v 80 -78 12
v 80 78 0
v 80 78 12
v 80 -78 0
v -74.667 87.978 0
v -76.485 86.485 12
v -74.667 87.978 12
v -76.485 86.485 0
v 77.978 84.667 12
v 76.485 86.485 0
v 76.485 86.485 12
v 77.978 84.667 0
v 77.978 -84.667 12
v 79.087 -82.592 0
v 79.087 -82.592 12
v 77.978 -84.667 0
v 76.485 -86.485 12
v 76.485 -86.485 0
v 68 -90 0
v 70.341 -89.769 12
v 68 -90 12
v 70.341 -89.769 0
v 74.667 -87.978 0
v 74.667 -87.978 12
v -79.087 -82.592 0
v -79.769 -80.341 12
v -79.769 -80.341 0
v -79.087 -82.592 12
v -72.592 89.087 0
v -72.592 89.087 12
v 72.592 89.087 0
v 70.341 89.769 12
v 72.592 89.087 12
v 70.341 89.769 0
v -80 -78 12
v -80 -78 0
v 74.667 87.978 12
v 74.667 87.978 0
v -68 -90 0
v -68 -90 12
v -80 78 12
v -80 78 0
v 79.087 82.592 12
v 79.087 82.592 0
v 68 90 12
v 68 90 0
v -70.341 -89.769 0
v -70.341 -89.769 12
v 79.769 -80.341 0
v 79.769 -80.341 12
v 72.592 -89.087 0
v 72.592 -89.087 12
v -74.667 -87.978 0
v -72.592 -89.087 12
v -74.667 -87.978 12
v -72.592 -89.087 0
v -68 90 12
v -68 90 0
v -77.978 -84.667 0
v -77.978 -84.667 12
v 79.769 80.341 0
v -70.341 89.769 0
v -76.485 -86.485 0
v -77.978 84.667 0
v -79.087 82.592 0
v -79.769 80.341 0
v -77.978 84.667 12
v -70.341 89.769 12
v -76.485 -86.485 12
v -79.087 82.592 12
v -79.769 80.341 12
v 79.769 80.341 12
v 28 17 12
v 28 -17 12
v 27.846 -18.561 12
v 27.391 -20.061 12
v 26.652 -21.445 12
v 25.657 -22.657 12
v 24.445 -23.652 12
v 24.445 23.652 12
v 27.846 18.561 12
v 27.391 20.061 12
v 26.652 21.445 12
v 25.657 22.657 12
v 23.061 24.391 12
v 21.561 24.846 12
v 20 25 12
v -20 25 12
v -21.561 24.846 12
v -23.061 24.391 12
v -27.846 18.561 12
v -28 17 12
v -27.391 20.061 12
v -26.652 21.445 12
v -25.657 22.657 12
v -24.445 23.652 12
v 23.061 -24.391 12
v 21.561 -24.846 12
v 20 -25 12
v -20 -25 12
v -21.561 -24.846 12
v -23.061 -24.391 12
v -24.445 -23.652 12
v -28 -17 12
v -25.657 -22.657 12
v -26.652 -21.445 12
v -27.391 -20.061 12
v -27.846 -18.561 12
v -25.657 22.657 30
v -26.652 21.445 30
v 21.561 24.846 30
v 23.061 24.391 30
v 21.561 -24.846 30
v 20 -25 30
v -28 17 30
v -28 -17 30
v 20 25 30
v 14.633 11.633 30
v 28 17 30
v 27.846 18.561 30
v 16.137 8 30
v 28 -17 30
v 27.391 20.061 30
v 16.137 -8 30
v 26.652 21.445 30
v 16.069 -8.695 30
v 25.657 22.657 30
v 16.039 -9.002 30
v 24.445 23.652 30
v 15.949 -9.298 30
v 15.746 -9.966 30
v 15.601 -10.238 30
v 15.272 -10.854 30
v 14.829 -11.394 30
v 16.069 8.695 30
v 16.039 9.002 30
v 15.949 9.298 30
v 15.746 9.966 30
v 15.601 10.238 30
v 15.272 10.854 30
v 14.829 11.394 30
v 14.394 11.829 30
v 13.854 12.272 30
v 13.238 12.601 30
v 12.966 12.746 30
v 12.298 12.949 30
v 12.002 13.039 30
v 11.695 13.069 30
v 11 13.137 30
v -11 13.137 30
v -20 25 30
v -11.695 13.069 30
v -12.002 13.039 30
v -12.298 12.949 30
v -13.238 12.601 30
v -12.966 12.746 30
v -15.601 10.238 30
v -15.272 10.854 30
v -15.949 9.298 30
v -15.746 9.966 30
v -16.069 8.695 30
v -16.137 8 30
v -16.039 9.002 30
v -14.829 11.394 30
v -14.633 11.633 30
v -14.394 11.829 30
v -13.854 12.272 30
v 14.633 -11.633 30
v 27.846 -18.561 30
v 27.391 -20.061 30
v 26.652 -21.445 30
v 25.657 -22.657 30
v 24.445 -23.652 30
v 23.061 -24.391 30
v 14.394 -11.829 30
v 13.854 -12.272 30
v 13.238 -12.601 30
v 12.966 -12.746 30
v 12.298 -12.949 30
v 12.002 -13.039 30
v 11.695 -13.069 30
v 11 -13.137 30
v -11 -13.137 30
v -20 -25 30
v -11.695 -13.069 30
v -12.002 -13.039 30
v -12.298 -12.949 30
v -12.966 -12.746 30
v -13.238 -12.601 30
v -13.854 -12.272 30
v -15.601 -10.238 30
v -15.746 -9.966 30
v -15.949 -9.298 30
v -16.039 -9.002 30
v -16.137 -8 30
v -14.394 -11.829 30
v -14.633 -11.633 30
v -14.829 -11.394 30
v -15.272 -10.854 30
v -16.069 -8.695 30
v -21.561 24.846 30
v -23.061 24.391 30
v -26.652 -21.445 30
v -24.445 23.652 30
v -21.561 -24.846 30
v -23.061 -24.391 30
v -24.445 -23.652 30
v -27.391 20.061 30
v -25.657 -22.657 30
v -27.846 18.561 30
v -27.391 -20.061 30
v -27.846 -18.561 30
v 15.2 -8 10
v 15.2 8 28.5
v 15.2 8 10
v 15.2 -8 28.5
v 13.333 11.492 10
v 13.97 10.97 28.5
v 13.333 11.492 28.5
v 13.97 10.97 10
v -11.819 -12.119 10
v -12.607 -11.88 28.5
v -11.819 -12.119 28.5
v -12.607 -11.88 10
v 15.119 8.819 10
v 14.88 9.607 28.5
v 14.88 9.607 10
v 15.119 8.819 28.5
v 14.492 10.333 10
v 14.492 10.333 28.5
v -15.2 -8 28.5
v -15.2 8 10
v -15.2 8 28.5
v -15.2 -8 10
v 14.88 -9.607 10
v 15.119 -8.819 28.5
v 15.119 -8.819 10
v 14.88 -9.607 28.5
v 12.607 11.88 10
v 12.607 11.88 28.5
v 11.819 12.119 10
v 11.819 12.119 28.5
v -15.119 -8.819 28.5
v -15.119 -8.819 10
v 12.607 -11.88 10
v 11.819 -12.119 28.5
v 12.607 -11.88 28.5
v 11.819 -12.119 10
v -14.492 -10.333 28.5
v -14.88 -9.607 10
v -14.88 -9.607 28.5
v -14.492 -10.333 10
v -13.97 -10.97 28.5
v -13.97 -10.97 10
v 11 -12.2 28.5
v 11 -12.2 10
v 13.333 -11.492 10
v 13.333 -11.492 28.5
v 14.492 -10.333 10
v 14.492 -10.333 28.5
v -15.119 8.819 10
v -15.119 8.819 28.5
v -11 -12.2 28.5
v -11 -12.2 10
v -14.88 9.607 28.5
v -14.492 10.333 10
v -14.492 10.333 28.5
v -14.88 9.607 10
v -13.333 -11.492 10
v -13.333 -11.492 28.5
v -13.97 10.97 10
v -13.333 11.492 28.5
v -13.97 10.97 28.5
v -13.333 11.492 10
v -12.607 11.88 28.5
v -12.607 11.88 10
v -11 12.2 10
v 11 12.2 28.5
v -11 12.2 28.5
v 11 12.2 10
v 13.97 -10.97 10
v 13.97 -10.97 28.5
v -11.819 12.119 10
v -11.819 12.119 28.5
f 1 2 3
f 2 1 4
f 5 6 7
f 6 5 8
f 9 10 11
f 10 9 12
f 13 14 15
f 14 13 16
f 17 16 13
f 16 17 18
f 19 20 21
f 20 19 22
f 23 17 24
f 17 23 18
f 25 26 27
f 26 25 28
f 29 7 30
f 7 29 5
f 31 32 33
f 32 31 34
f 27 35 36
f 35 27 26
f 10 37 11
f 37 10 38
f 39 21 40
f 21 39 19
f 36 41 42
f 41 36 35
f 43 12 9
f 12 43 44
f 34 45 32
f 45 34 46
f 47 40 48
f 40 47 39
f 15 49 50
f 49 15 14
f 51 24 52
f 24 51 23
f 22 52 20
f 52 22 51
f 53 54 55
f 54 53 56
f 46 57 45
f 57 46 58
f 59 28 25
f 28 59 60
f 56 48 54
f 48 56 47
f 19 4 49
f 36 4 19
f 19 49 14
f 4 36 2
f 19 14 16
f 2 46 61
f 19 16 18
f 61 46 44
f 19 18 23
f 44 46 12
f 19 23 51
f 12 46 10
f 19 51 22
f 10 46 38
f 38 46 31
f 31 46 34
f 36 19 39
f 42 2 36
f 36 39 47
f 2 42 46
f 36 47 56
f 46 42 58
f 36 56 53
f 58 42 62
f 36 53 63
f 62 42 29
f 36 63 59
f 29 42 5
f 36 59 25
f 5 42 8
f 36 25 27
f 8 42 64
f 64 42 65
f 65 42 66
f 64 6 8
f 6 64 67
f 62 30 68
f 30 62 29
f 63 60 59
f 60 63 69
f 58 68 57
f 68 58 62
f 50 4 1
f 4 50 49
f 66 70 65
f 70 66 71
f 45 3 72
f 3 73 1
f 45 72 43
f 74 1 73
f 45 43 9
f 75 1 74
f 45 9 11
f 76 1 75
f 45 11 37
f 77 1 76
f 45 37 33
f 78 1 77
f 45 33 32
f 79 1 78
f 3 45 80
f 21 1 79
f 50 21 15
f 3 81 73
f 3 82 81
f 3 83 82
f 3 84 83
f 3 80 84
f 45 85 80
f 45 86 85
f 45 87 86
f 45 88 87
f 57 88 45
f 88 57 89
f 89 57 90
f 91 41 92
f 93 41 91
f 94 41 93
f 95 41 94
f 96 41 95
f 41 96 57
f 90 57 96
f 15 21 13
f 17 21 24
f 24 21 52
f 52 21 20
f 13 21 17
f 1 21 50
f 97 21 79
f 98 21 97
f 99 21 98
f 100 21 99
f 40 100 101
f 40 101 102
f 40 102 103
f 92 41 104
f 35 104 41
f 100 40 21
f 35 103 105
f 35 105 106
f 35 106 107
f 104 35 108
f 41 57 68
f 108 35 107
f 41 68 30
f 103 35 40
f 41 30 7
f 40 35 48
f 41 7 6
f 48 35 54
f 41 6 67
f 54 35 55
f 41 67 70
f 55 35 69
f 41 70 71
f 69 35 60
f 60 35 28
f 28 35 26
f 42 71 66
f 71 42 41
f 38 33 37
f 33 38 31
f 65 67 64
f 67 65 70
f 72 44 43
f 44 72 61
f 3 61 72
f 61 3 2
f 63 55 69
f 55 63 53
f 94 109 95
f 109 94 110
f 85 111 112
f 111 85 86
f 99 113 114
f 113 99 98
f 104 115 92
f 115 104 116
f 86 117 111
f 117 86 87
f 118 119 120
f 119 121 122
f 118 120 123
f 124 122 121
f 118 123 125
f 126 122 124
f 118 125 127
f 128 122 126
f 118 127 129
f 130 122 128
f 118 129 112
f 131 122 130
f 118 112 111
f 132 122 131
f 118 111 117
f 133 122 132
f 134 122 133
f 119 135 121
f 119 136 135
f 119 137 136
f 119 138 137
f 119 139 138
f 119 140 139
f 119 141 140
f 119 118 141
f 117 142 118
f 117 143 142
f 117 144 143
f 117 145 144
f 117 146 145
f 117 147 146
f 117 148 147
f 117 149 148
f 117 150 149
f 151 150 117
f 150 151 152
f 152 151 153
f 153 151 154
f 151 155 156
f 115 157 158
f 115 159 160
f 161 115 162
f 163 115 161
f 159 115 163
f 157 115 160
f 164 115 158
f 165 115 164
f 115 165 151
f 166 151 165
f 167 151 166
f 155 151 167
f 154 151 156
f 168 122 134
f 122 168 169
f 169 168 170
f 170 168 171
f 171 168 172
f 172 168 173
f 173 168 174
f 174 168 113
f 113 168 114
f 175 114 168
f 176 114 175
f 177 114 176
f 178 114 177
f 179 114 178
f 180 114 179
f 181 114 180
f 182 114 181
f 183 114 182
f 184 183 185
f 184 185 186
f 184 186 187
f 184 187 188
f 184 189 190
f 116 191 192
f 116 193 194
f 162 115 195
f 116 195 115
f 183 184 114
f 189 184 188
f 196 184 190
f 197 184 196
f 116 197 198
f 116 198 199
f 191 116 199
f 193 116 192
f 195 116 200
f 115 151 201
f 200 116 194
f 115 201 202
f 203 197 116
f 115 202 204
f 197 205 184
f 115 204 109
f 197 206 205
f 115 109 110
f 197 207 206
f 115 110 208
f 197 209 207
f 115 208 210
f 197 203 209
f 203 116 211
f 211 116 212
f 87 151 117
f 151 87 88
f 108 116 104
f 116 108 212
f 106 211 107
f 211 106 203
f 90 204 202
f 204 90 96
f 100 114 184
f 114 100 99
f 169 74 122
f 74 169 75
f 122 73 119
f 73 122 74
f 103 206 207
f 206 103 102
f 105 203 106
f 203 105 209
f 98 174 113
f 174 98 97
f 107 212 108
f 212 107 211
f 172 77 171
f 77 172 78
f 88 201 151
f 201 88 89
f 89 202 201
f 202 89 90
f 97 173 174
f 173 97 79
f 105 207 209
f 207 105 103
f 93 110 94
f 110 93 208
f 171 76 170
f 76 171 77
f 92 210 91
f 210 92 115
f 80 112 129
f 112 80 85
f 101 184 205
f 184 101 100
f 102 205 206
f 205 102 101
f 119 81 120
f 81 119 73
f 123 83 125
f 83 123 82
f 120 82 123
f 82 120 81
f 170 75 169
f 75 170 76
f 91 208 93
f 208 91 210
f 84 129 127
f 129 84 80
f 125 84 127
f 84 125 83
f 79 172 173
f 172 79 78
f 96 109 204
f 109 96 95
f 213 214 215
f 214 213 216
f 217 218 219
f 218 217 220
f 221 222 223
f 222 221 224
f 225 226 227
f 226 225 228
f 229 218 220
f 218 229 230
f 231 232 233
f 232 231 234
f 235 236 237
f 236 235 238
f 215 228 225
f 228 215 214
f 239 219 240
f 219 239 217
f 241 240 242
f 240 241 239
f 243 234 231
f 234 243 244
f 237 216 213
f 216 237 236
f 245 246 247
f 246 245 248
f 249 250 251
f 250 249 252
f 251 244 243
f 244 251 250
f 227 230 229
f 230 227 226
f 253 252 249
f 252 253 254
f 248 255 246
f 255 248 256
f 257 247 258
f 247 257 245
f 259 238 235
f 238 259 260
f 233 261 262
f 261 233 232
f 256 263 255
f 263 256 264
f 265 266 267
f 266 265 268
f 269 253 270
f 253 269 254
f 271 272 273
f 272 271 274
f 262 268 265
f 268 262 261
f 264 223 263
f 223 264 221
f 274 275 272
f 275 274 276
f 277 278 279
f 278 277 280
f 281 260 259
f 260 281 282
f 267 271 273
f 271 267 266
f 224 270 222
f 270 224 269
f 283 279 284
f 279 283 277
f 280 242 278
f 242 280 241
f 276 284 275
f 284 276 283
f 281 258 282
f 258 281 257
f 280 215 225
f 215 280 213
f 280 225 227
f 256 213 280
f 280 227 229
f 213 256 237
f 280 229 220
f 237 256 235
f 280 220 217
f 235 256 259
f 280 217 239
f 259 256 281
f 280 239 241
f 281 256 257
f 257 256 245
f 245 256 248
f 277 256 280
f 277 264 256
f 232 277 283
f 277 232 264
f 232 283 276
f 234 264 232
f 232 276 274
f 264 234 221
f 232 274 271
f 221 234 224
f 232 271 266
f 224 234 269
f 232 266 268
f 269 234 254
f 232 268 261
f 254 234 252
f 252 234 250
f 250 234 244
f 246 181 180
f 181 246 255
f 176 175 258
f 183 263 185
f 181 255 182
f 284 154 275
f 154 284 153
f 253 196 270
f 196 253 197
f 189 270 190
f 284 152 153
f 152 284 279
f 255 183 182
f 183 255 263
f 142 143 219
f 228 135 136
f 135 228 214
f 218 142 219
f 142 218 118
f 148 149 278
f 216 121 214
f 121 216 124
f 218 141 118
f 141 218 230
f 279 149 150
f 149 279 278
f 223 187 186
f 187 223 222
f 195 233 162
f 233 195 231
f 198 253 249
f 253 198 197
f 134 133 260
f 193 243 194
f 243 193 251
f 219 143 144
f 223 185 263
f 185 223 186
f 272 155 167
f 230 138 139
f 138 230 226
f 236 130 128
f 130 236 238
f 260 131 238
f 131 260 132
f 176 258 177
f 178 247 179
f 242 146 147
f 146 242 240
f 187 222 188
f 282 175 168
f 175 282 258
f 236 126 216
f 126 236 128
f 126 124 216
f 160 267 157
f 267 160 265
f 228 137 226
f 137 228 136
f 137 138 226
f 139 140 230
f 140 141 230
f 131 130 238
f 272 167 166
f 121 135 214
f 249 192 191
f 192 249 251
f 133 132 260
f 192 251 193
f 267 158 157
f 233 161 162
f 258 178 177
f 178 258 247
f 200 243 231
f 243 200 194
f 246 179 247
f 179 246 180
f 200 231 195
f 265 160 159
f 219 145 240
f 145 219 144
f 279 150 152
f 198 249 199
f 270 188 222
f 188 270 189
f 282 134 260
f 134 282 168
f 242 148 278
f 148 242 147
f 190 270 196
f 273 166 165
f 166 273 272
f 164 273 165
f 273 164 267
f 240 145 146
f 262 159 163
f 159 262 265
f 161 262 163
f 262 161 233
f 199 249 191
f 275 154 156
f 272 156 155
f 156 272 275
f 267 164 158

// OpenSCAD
// Headphone stand in three parts - PLA, no supports, 0.4mm nozzle
// Print orientations (+Z up, bottom on bed):
//   base   : flat, plate bottom on bed
//   post   : vertical, bottom on bed (250+ tall)
//   hanger : flat bottom on bed, curved top up, socket opening down (bridged)
// Assembly (desk Z=0): base 0-30, post 10-262, hanger 244-270 (top ~270)

part = "base"; // [base:Base, post:Post, hanger:Hanger, assembly:Assembly]
cadverify_only = "";
module instance(name, part, unit = 1) {
    echo(cadverify_instance = [name, part, unit]);
    if (cadverify_only == "" || cadverify_only == name) children();
}

// ---------- parameters ----------
baseW = 160; baseD = 180; baseT = 12; baseR = 12;
bossW = 56; bossD = 50; bossH = 18; bossR = 8;
bossTop = baseT + bossH; // 30
sockW = 30.4; sockD = 24.4; sockR = 4.2; // base socket (post 30x24 +0.4)
sockDepthBase = 20;
sockFloorBase = bossTop - sockDepthBase; // 10
flare = 1.5;
mouthWBase = sockW + 2*flare; mouthDBase = sockD + 2*flare; mouthRBase = sockR + flare;

postW = 30; postD = 24; postR = 4; postH = 252; postCham = 1.5;
tipW = postW - 2*postCham; tipD = postD - 2*postCham; tipR = 2.5;

hangW = 42; hangL = 120; hangZc = 26; hangZe = 14; hangFillet = 8; hangPlanR = 15;
hangSockW = 30.4; hangSockD = 24.4; hangSockR = 4.2; hangSockDepth = 18;
mouthWH = hangSockW + 2*flare; mouthDH = hangSockD + 2*flare; mouthRH = hangSockR + flare;

postZ = 10;          // post bottom in assembly
hangerZ = 244;       // hanger bottom in assembly -> top 270
// post top = postZ+postH = 262 = hangerZ+hangSockDepth (socket floor)

// ---------- helpers ----------
module rounded_box(W,D,H,R) {
    // centered in XY, bottom at Z=0
    if (R <= 0.01) {
        translate([-W/2,-D/2,0]) cube([W,D,H]);
    } else {
        hull() {
            for (sx=[-1,1], sy=[-1,1])
                translate([sx*(W/2-R), sy*(D/2-R), 0])
                    cylinder(r=R, h=H, $fn=32);
        }
    }
}
module rect_frustum(W1,D1,R1, W2,D2,R2, H) {
    // bottom size 1 at Z=0, top size 2 at Z=H
    hull() {
        translate([0,0,0]) rounded_box(W1,D1,0.1,R1);
        translate([0,0,H-0.1]) rounded_box(W2,D2,0.1,R2);
    }
}

// ---------- parts (print orientation, bottom Z=0, centered XY) ----------
module base_part() {
    difference() {
        union() {
            rounded_box(baseW, baseD, baseT, baseR);
            translate([0,0,baseT-0.2]) rounded_box(bossW, bossD, bossH+0.2, bossR);
        }
        // socket bore (extend above mouth for clean cut)
        translate([0,0,sockFloorBase]) rounded_box(sockW, sockD, sockDepthBase+1.0, sockR);
        // entry flare 45deg (mouth larger at top)
        translate([0,0,bossTop-flare])
            rect_frustum(sockW,sockD,sockR, mouthWBase,mouthDBase,mouthRBase, flare+1.0);
    }
}

module post_part() {
    // single hull of nested rounded-rect slices: no internal ledges,
    // straight sides, 45° lead-in chamfers at both ends
    hull() {
        translate([0,0,0]) rounded_box(tipW, tipD, 0.2, tipR);
        translate([0,0,postCham-0.15]) rounded_box(postW, postD, 0.3, postR);
        translate([0,0,postH-postCham-0.15]) rounded_box(postW, postD, 0.3, postR);
        translate([0,0,postH-0.2]) rounded_box(tipW, tipD, 0.2, tipR);
    }
}

module hanger_A() {
    union() {
        // lower block 0 .. Zc-r
        translate([-hangW/2, -hangL/2, 0]) cube([hangW, hangL, hangZc-hangFillet]);
        // upper block (narrower) Zc-r .. top
        translate([-(hangW-2*hangFillet)/2, -hangL/2, hangZc-hangFillet])
            cube([hangW-2*hangFillet, hangL, hangFillet]);
        // two side fillet cylinders along Y
        for (sx=[-1,1])
            translate([sx*(hangW/2-hangFillet), -hangL/2, hangZc-hangFillet])
                rotate([-90,0,0])
                    cylinder(r=hangFillet, h=hangL, $fn=32);
    }
}
module hanger_B() {
    // hull of slices under parabolic top (convex hypograph)
    N = 25;
    hull() {
        for (i=[0:N-1]) {
            yi = -hangL/2 + hangL*i/(N-1);
            hi = hangZc - (hangZc-hangZe)*pow(2*yi/hangL,2);
            translate([-hangW/2, yi-0.3, 0]) cube([hangW, 0.6, hi]);
        }
    }
}
module hanger_D() {
    rounded_box(hangW, hangL, 30, hangPlanR);
}
module hanger_part() {
    difference() {
        intersection() {
            hanger_A();
            hanger_B();
            hanger_D();
        }
        // socket bore (extend below bed for clean cut)
        translate([0,0,-0.5]) rounded_box(hangSockW, hangSockD, hangSockDepth+0.5, hangSockR);
        // entry flare at mouth (bottom)
        translate([0,0,-0.5])
            rect_frustum(mouthWH,mouthDH,mouthRH, hangSockW,hangSockD,hangSockR, flare+0.5);
    }
}

// ---------- specs ----------
if (part == "base") {
    echo(cadverify_spec = [
        ["bounds", [[-baseW/2, -baseD/2, 0], [baseW/2, baseD/2, bossTop]]],
        ["bodies", 1],
        ["through_holes", 0],
        ["support_faces", [["bed", "-z", 20000]]],
        ["overhangs_allowed", []],
        ["copies", 1],
        ["details", [
            ["plate", "material", [[-baseW/2, -baseD/2, 0], [baseW/2, baseD/2, baseT]], 0.95],
            ["boss", "material", [[-bossW/2, -bossD/2, baseT], [bossW/2, bossD/2, bossTop]], 0.60],
            ["socket", "void", [[-sockW/2, -sockD/2, sockFloorBase], [sockW/2, sockD/2, bossTop]], 0.90],
            ["floor", "thickness", [0, 0, -5], [0, 0, 1], 10],
            ["corner", "view", [[65, 75, 0], [80, 90, 12]]],
            ["mouth", "view", [[-17, -14, 28], [17, 14, 30]]]
        ]]
    ]);
    base_part();
} else if (part == "post") {
    echo(cadverify_spec = [
        ["bounds", [[-postW/2, -postD/2, 0], [postW/2, postD/2, postH]]],
        ["bodies", 1],
        ["through_holes", 0],
        ["support_faces", [["bed", "-z", 400]]],
        ["overhangs_allowed", []],
        ["copies", 1],
        ["details", [
            ["shaft", "material", [[-9.5, -9.5, 10], [9.5, 9.5, 242]], 0.99],
            ["wall", "thickness", [30, 0, 126], [-1, 0, 0], 30],
            ["lead", "view", [[-15, -12, 0], [15, 12, 3]]],
            ["topcham", "view", [[-15, -12, 249], [15, 12, 252]]]
        ]]
    ]);
    post_part();
} else if (part == "hanger") {
    echo(cadverify_spec = [
        ["bounds", [[-hangW/2, -hangL/2, 0], [hangW/2, hangL/2, hangZc]]],
        ["bodies", 1],
        ["through_holes", 0],
        ["support_faces", [["bed", "-z", 2500]]],
        ["overhangs_allowed", [["bridging socket ceiling", [[-hangSockW/2, -hangSockD/2, 16], [hangSockW/2, hangSockD/2, 20]]]]],
        ["copies", 1],
        ["details", [
            ["contact", "material", [[-15, -30, 18], [15, 30, 22]], 0.95],
            ["socket", "void", [[-hangSockW/2, -hangSockD/2, 0], [hangSockW/2, hangSockD/2, hangSockDepth]], 0.90],
            ["topwall", "thickness", [0, 0, 30], [0, 0, -1], 8],
            ["fillet", "view", [[13, -20, 18], [21, 20, 26]]],
            ["arch", "view", [[-21, -60, 12], [21, -40, 16]]],
            ["mouth", "view", [[-17, -14, 0], [17, 14, 2]]]
        ]]
    ]);
    hanger_part();
} else if (part == "assembly") {
    echo(cadverify_spec = [
        ["bounds", [[-baseW/2, -baseD/2, 0], [baseW/2, baseD/2, hangerZ+hangZc]]],
        ["support_faces", [["desk", "-z", 20000]]],
        ["allowed_interferences", []],
        ["motions", []],
        ["assembly_order", [
            [["base_1"], [0, 0, 0]],
            [["post_1"], [0, 0, -1]],
            [["hanger_1"], [0, 0, -1]]
        ]]
    ]);
    instance("base_1", "base") translate([0,0,0]) base_part();
    instance("post_1", "post") translate([0,0,postZ]) post_part();
    instance("hanger_1", "hanger") translate([0,0,hangerZ]) hanger_part();
}
